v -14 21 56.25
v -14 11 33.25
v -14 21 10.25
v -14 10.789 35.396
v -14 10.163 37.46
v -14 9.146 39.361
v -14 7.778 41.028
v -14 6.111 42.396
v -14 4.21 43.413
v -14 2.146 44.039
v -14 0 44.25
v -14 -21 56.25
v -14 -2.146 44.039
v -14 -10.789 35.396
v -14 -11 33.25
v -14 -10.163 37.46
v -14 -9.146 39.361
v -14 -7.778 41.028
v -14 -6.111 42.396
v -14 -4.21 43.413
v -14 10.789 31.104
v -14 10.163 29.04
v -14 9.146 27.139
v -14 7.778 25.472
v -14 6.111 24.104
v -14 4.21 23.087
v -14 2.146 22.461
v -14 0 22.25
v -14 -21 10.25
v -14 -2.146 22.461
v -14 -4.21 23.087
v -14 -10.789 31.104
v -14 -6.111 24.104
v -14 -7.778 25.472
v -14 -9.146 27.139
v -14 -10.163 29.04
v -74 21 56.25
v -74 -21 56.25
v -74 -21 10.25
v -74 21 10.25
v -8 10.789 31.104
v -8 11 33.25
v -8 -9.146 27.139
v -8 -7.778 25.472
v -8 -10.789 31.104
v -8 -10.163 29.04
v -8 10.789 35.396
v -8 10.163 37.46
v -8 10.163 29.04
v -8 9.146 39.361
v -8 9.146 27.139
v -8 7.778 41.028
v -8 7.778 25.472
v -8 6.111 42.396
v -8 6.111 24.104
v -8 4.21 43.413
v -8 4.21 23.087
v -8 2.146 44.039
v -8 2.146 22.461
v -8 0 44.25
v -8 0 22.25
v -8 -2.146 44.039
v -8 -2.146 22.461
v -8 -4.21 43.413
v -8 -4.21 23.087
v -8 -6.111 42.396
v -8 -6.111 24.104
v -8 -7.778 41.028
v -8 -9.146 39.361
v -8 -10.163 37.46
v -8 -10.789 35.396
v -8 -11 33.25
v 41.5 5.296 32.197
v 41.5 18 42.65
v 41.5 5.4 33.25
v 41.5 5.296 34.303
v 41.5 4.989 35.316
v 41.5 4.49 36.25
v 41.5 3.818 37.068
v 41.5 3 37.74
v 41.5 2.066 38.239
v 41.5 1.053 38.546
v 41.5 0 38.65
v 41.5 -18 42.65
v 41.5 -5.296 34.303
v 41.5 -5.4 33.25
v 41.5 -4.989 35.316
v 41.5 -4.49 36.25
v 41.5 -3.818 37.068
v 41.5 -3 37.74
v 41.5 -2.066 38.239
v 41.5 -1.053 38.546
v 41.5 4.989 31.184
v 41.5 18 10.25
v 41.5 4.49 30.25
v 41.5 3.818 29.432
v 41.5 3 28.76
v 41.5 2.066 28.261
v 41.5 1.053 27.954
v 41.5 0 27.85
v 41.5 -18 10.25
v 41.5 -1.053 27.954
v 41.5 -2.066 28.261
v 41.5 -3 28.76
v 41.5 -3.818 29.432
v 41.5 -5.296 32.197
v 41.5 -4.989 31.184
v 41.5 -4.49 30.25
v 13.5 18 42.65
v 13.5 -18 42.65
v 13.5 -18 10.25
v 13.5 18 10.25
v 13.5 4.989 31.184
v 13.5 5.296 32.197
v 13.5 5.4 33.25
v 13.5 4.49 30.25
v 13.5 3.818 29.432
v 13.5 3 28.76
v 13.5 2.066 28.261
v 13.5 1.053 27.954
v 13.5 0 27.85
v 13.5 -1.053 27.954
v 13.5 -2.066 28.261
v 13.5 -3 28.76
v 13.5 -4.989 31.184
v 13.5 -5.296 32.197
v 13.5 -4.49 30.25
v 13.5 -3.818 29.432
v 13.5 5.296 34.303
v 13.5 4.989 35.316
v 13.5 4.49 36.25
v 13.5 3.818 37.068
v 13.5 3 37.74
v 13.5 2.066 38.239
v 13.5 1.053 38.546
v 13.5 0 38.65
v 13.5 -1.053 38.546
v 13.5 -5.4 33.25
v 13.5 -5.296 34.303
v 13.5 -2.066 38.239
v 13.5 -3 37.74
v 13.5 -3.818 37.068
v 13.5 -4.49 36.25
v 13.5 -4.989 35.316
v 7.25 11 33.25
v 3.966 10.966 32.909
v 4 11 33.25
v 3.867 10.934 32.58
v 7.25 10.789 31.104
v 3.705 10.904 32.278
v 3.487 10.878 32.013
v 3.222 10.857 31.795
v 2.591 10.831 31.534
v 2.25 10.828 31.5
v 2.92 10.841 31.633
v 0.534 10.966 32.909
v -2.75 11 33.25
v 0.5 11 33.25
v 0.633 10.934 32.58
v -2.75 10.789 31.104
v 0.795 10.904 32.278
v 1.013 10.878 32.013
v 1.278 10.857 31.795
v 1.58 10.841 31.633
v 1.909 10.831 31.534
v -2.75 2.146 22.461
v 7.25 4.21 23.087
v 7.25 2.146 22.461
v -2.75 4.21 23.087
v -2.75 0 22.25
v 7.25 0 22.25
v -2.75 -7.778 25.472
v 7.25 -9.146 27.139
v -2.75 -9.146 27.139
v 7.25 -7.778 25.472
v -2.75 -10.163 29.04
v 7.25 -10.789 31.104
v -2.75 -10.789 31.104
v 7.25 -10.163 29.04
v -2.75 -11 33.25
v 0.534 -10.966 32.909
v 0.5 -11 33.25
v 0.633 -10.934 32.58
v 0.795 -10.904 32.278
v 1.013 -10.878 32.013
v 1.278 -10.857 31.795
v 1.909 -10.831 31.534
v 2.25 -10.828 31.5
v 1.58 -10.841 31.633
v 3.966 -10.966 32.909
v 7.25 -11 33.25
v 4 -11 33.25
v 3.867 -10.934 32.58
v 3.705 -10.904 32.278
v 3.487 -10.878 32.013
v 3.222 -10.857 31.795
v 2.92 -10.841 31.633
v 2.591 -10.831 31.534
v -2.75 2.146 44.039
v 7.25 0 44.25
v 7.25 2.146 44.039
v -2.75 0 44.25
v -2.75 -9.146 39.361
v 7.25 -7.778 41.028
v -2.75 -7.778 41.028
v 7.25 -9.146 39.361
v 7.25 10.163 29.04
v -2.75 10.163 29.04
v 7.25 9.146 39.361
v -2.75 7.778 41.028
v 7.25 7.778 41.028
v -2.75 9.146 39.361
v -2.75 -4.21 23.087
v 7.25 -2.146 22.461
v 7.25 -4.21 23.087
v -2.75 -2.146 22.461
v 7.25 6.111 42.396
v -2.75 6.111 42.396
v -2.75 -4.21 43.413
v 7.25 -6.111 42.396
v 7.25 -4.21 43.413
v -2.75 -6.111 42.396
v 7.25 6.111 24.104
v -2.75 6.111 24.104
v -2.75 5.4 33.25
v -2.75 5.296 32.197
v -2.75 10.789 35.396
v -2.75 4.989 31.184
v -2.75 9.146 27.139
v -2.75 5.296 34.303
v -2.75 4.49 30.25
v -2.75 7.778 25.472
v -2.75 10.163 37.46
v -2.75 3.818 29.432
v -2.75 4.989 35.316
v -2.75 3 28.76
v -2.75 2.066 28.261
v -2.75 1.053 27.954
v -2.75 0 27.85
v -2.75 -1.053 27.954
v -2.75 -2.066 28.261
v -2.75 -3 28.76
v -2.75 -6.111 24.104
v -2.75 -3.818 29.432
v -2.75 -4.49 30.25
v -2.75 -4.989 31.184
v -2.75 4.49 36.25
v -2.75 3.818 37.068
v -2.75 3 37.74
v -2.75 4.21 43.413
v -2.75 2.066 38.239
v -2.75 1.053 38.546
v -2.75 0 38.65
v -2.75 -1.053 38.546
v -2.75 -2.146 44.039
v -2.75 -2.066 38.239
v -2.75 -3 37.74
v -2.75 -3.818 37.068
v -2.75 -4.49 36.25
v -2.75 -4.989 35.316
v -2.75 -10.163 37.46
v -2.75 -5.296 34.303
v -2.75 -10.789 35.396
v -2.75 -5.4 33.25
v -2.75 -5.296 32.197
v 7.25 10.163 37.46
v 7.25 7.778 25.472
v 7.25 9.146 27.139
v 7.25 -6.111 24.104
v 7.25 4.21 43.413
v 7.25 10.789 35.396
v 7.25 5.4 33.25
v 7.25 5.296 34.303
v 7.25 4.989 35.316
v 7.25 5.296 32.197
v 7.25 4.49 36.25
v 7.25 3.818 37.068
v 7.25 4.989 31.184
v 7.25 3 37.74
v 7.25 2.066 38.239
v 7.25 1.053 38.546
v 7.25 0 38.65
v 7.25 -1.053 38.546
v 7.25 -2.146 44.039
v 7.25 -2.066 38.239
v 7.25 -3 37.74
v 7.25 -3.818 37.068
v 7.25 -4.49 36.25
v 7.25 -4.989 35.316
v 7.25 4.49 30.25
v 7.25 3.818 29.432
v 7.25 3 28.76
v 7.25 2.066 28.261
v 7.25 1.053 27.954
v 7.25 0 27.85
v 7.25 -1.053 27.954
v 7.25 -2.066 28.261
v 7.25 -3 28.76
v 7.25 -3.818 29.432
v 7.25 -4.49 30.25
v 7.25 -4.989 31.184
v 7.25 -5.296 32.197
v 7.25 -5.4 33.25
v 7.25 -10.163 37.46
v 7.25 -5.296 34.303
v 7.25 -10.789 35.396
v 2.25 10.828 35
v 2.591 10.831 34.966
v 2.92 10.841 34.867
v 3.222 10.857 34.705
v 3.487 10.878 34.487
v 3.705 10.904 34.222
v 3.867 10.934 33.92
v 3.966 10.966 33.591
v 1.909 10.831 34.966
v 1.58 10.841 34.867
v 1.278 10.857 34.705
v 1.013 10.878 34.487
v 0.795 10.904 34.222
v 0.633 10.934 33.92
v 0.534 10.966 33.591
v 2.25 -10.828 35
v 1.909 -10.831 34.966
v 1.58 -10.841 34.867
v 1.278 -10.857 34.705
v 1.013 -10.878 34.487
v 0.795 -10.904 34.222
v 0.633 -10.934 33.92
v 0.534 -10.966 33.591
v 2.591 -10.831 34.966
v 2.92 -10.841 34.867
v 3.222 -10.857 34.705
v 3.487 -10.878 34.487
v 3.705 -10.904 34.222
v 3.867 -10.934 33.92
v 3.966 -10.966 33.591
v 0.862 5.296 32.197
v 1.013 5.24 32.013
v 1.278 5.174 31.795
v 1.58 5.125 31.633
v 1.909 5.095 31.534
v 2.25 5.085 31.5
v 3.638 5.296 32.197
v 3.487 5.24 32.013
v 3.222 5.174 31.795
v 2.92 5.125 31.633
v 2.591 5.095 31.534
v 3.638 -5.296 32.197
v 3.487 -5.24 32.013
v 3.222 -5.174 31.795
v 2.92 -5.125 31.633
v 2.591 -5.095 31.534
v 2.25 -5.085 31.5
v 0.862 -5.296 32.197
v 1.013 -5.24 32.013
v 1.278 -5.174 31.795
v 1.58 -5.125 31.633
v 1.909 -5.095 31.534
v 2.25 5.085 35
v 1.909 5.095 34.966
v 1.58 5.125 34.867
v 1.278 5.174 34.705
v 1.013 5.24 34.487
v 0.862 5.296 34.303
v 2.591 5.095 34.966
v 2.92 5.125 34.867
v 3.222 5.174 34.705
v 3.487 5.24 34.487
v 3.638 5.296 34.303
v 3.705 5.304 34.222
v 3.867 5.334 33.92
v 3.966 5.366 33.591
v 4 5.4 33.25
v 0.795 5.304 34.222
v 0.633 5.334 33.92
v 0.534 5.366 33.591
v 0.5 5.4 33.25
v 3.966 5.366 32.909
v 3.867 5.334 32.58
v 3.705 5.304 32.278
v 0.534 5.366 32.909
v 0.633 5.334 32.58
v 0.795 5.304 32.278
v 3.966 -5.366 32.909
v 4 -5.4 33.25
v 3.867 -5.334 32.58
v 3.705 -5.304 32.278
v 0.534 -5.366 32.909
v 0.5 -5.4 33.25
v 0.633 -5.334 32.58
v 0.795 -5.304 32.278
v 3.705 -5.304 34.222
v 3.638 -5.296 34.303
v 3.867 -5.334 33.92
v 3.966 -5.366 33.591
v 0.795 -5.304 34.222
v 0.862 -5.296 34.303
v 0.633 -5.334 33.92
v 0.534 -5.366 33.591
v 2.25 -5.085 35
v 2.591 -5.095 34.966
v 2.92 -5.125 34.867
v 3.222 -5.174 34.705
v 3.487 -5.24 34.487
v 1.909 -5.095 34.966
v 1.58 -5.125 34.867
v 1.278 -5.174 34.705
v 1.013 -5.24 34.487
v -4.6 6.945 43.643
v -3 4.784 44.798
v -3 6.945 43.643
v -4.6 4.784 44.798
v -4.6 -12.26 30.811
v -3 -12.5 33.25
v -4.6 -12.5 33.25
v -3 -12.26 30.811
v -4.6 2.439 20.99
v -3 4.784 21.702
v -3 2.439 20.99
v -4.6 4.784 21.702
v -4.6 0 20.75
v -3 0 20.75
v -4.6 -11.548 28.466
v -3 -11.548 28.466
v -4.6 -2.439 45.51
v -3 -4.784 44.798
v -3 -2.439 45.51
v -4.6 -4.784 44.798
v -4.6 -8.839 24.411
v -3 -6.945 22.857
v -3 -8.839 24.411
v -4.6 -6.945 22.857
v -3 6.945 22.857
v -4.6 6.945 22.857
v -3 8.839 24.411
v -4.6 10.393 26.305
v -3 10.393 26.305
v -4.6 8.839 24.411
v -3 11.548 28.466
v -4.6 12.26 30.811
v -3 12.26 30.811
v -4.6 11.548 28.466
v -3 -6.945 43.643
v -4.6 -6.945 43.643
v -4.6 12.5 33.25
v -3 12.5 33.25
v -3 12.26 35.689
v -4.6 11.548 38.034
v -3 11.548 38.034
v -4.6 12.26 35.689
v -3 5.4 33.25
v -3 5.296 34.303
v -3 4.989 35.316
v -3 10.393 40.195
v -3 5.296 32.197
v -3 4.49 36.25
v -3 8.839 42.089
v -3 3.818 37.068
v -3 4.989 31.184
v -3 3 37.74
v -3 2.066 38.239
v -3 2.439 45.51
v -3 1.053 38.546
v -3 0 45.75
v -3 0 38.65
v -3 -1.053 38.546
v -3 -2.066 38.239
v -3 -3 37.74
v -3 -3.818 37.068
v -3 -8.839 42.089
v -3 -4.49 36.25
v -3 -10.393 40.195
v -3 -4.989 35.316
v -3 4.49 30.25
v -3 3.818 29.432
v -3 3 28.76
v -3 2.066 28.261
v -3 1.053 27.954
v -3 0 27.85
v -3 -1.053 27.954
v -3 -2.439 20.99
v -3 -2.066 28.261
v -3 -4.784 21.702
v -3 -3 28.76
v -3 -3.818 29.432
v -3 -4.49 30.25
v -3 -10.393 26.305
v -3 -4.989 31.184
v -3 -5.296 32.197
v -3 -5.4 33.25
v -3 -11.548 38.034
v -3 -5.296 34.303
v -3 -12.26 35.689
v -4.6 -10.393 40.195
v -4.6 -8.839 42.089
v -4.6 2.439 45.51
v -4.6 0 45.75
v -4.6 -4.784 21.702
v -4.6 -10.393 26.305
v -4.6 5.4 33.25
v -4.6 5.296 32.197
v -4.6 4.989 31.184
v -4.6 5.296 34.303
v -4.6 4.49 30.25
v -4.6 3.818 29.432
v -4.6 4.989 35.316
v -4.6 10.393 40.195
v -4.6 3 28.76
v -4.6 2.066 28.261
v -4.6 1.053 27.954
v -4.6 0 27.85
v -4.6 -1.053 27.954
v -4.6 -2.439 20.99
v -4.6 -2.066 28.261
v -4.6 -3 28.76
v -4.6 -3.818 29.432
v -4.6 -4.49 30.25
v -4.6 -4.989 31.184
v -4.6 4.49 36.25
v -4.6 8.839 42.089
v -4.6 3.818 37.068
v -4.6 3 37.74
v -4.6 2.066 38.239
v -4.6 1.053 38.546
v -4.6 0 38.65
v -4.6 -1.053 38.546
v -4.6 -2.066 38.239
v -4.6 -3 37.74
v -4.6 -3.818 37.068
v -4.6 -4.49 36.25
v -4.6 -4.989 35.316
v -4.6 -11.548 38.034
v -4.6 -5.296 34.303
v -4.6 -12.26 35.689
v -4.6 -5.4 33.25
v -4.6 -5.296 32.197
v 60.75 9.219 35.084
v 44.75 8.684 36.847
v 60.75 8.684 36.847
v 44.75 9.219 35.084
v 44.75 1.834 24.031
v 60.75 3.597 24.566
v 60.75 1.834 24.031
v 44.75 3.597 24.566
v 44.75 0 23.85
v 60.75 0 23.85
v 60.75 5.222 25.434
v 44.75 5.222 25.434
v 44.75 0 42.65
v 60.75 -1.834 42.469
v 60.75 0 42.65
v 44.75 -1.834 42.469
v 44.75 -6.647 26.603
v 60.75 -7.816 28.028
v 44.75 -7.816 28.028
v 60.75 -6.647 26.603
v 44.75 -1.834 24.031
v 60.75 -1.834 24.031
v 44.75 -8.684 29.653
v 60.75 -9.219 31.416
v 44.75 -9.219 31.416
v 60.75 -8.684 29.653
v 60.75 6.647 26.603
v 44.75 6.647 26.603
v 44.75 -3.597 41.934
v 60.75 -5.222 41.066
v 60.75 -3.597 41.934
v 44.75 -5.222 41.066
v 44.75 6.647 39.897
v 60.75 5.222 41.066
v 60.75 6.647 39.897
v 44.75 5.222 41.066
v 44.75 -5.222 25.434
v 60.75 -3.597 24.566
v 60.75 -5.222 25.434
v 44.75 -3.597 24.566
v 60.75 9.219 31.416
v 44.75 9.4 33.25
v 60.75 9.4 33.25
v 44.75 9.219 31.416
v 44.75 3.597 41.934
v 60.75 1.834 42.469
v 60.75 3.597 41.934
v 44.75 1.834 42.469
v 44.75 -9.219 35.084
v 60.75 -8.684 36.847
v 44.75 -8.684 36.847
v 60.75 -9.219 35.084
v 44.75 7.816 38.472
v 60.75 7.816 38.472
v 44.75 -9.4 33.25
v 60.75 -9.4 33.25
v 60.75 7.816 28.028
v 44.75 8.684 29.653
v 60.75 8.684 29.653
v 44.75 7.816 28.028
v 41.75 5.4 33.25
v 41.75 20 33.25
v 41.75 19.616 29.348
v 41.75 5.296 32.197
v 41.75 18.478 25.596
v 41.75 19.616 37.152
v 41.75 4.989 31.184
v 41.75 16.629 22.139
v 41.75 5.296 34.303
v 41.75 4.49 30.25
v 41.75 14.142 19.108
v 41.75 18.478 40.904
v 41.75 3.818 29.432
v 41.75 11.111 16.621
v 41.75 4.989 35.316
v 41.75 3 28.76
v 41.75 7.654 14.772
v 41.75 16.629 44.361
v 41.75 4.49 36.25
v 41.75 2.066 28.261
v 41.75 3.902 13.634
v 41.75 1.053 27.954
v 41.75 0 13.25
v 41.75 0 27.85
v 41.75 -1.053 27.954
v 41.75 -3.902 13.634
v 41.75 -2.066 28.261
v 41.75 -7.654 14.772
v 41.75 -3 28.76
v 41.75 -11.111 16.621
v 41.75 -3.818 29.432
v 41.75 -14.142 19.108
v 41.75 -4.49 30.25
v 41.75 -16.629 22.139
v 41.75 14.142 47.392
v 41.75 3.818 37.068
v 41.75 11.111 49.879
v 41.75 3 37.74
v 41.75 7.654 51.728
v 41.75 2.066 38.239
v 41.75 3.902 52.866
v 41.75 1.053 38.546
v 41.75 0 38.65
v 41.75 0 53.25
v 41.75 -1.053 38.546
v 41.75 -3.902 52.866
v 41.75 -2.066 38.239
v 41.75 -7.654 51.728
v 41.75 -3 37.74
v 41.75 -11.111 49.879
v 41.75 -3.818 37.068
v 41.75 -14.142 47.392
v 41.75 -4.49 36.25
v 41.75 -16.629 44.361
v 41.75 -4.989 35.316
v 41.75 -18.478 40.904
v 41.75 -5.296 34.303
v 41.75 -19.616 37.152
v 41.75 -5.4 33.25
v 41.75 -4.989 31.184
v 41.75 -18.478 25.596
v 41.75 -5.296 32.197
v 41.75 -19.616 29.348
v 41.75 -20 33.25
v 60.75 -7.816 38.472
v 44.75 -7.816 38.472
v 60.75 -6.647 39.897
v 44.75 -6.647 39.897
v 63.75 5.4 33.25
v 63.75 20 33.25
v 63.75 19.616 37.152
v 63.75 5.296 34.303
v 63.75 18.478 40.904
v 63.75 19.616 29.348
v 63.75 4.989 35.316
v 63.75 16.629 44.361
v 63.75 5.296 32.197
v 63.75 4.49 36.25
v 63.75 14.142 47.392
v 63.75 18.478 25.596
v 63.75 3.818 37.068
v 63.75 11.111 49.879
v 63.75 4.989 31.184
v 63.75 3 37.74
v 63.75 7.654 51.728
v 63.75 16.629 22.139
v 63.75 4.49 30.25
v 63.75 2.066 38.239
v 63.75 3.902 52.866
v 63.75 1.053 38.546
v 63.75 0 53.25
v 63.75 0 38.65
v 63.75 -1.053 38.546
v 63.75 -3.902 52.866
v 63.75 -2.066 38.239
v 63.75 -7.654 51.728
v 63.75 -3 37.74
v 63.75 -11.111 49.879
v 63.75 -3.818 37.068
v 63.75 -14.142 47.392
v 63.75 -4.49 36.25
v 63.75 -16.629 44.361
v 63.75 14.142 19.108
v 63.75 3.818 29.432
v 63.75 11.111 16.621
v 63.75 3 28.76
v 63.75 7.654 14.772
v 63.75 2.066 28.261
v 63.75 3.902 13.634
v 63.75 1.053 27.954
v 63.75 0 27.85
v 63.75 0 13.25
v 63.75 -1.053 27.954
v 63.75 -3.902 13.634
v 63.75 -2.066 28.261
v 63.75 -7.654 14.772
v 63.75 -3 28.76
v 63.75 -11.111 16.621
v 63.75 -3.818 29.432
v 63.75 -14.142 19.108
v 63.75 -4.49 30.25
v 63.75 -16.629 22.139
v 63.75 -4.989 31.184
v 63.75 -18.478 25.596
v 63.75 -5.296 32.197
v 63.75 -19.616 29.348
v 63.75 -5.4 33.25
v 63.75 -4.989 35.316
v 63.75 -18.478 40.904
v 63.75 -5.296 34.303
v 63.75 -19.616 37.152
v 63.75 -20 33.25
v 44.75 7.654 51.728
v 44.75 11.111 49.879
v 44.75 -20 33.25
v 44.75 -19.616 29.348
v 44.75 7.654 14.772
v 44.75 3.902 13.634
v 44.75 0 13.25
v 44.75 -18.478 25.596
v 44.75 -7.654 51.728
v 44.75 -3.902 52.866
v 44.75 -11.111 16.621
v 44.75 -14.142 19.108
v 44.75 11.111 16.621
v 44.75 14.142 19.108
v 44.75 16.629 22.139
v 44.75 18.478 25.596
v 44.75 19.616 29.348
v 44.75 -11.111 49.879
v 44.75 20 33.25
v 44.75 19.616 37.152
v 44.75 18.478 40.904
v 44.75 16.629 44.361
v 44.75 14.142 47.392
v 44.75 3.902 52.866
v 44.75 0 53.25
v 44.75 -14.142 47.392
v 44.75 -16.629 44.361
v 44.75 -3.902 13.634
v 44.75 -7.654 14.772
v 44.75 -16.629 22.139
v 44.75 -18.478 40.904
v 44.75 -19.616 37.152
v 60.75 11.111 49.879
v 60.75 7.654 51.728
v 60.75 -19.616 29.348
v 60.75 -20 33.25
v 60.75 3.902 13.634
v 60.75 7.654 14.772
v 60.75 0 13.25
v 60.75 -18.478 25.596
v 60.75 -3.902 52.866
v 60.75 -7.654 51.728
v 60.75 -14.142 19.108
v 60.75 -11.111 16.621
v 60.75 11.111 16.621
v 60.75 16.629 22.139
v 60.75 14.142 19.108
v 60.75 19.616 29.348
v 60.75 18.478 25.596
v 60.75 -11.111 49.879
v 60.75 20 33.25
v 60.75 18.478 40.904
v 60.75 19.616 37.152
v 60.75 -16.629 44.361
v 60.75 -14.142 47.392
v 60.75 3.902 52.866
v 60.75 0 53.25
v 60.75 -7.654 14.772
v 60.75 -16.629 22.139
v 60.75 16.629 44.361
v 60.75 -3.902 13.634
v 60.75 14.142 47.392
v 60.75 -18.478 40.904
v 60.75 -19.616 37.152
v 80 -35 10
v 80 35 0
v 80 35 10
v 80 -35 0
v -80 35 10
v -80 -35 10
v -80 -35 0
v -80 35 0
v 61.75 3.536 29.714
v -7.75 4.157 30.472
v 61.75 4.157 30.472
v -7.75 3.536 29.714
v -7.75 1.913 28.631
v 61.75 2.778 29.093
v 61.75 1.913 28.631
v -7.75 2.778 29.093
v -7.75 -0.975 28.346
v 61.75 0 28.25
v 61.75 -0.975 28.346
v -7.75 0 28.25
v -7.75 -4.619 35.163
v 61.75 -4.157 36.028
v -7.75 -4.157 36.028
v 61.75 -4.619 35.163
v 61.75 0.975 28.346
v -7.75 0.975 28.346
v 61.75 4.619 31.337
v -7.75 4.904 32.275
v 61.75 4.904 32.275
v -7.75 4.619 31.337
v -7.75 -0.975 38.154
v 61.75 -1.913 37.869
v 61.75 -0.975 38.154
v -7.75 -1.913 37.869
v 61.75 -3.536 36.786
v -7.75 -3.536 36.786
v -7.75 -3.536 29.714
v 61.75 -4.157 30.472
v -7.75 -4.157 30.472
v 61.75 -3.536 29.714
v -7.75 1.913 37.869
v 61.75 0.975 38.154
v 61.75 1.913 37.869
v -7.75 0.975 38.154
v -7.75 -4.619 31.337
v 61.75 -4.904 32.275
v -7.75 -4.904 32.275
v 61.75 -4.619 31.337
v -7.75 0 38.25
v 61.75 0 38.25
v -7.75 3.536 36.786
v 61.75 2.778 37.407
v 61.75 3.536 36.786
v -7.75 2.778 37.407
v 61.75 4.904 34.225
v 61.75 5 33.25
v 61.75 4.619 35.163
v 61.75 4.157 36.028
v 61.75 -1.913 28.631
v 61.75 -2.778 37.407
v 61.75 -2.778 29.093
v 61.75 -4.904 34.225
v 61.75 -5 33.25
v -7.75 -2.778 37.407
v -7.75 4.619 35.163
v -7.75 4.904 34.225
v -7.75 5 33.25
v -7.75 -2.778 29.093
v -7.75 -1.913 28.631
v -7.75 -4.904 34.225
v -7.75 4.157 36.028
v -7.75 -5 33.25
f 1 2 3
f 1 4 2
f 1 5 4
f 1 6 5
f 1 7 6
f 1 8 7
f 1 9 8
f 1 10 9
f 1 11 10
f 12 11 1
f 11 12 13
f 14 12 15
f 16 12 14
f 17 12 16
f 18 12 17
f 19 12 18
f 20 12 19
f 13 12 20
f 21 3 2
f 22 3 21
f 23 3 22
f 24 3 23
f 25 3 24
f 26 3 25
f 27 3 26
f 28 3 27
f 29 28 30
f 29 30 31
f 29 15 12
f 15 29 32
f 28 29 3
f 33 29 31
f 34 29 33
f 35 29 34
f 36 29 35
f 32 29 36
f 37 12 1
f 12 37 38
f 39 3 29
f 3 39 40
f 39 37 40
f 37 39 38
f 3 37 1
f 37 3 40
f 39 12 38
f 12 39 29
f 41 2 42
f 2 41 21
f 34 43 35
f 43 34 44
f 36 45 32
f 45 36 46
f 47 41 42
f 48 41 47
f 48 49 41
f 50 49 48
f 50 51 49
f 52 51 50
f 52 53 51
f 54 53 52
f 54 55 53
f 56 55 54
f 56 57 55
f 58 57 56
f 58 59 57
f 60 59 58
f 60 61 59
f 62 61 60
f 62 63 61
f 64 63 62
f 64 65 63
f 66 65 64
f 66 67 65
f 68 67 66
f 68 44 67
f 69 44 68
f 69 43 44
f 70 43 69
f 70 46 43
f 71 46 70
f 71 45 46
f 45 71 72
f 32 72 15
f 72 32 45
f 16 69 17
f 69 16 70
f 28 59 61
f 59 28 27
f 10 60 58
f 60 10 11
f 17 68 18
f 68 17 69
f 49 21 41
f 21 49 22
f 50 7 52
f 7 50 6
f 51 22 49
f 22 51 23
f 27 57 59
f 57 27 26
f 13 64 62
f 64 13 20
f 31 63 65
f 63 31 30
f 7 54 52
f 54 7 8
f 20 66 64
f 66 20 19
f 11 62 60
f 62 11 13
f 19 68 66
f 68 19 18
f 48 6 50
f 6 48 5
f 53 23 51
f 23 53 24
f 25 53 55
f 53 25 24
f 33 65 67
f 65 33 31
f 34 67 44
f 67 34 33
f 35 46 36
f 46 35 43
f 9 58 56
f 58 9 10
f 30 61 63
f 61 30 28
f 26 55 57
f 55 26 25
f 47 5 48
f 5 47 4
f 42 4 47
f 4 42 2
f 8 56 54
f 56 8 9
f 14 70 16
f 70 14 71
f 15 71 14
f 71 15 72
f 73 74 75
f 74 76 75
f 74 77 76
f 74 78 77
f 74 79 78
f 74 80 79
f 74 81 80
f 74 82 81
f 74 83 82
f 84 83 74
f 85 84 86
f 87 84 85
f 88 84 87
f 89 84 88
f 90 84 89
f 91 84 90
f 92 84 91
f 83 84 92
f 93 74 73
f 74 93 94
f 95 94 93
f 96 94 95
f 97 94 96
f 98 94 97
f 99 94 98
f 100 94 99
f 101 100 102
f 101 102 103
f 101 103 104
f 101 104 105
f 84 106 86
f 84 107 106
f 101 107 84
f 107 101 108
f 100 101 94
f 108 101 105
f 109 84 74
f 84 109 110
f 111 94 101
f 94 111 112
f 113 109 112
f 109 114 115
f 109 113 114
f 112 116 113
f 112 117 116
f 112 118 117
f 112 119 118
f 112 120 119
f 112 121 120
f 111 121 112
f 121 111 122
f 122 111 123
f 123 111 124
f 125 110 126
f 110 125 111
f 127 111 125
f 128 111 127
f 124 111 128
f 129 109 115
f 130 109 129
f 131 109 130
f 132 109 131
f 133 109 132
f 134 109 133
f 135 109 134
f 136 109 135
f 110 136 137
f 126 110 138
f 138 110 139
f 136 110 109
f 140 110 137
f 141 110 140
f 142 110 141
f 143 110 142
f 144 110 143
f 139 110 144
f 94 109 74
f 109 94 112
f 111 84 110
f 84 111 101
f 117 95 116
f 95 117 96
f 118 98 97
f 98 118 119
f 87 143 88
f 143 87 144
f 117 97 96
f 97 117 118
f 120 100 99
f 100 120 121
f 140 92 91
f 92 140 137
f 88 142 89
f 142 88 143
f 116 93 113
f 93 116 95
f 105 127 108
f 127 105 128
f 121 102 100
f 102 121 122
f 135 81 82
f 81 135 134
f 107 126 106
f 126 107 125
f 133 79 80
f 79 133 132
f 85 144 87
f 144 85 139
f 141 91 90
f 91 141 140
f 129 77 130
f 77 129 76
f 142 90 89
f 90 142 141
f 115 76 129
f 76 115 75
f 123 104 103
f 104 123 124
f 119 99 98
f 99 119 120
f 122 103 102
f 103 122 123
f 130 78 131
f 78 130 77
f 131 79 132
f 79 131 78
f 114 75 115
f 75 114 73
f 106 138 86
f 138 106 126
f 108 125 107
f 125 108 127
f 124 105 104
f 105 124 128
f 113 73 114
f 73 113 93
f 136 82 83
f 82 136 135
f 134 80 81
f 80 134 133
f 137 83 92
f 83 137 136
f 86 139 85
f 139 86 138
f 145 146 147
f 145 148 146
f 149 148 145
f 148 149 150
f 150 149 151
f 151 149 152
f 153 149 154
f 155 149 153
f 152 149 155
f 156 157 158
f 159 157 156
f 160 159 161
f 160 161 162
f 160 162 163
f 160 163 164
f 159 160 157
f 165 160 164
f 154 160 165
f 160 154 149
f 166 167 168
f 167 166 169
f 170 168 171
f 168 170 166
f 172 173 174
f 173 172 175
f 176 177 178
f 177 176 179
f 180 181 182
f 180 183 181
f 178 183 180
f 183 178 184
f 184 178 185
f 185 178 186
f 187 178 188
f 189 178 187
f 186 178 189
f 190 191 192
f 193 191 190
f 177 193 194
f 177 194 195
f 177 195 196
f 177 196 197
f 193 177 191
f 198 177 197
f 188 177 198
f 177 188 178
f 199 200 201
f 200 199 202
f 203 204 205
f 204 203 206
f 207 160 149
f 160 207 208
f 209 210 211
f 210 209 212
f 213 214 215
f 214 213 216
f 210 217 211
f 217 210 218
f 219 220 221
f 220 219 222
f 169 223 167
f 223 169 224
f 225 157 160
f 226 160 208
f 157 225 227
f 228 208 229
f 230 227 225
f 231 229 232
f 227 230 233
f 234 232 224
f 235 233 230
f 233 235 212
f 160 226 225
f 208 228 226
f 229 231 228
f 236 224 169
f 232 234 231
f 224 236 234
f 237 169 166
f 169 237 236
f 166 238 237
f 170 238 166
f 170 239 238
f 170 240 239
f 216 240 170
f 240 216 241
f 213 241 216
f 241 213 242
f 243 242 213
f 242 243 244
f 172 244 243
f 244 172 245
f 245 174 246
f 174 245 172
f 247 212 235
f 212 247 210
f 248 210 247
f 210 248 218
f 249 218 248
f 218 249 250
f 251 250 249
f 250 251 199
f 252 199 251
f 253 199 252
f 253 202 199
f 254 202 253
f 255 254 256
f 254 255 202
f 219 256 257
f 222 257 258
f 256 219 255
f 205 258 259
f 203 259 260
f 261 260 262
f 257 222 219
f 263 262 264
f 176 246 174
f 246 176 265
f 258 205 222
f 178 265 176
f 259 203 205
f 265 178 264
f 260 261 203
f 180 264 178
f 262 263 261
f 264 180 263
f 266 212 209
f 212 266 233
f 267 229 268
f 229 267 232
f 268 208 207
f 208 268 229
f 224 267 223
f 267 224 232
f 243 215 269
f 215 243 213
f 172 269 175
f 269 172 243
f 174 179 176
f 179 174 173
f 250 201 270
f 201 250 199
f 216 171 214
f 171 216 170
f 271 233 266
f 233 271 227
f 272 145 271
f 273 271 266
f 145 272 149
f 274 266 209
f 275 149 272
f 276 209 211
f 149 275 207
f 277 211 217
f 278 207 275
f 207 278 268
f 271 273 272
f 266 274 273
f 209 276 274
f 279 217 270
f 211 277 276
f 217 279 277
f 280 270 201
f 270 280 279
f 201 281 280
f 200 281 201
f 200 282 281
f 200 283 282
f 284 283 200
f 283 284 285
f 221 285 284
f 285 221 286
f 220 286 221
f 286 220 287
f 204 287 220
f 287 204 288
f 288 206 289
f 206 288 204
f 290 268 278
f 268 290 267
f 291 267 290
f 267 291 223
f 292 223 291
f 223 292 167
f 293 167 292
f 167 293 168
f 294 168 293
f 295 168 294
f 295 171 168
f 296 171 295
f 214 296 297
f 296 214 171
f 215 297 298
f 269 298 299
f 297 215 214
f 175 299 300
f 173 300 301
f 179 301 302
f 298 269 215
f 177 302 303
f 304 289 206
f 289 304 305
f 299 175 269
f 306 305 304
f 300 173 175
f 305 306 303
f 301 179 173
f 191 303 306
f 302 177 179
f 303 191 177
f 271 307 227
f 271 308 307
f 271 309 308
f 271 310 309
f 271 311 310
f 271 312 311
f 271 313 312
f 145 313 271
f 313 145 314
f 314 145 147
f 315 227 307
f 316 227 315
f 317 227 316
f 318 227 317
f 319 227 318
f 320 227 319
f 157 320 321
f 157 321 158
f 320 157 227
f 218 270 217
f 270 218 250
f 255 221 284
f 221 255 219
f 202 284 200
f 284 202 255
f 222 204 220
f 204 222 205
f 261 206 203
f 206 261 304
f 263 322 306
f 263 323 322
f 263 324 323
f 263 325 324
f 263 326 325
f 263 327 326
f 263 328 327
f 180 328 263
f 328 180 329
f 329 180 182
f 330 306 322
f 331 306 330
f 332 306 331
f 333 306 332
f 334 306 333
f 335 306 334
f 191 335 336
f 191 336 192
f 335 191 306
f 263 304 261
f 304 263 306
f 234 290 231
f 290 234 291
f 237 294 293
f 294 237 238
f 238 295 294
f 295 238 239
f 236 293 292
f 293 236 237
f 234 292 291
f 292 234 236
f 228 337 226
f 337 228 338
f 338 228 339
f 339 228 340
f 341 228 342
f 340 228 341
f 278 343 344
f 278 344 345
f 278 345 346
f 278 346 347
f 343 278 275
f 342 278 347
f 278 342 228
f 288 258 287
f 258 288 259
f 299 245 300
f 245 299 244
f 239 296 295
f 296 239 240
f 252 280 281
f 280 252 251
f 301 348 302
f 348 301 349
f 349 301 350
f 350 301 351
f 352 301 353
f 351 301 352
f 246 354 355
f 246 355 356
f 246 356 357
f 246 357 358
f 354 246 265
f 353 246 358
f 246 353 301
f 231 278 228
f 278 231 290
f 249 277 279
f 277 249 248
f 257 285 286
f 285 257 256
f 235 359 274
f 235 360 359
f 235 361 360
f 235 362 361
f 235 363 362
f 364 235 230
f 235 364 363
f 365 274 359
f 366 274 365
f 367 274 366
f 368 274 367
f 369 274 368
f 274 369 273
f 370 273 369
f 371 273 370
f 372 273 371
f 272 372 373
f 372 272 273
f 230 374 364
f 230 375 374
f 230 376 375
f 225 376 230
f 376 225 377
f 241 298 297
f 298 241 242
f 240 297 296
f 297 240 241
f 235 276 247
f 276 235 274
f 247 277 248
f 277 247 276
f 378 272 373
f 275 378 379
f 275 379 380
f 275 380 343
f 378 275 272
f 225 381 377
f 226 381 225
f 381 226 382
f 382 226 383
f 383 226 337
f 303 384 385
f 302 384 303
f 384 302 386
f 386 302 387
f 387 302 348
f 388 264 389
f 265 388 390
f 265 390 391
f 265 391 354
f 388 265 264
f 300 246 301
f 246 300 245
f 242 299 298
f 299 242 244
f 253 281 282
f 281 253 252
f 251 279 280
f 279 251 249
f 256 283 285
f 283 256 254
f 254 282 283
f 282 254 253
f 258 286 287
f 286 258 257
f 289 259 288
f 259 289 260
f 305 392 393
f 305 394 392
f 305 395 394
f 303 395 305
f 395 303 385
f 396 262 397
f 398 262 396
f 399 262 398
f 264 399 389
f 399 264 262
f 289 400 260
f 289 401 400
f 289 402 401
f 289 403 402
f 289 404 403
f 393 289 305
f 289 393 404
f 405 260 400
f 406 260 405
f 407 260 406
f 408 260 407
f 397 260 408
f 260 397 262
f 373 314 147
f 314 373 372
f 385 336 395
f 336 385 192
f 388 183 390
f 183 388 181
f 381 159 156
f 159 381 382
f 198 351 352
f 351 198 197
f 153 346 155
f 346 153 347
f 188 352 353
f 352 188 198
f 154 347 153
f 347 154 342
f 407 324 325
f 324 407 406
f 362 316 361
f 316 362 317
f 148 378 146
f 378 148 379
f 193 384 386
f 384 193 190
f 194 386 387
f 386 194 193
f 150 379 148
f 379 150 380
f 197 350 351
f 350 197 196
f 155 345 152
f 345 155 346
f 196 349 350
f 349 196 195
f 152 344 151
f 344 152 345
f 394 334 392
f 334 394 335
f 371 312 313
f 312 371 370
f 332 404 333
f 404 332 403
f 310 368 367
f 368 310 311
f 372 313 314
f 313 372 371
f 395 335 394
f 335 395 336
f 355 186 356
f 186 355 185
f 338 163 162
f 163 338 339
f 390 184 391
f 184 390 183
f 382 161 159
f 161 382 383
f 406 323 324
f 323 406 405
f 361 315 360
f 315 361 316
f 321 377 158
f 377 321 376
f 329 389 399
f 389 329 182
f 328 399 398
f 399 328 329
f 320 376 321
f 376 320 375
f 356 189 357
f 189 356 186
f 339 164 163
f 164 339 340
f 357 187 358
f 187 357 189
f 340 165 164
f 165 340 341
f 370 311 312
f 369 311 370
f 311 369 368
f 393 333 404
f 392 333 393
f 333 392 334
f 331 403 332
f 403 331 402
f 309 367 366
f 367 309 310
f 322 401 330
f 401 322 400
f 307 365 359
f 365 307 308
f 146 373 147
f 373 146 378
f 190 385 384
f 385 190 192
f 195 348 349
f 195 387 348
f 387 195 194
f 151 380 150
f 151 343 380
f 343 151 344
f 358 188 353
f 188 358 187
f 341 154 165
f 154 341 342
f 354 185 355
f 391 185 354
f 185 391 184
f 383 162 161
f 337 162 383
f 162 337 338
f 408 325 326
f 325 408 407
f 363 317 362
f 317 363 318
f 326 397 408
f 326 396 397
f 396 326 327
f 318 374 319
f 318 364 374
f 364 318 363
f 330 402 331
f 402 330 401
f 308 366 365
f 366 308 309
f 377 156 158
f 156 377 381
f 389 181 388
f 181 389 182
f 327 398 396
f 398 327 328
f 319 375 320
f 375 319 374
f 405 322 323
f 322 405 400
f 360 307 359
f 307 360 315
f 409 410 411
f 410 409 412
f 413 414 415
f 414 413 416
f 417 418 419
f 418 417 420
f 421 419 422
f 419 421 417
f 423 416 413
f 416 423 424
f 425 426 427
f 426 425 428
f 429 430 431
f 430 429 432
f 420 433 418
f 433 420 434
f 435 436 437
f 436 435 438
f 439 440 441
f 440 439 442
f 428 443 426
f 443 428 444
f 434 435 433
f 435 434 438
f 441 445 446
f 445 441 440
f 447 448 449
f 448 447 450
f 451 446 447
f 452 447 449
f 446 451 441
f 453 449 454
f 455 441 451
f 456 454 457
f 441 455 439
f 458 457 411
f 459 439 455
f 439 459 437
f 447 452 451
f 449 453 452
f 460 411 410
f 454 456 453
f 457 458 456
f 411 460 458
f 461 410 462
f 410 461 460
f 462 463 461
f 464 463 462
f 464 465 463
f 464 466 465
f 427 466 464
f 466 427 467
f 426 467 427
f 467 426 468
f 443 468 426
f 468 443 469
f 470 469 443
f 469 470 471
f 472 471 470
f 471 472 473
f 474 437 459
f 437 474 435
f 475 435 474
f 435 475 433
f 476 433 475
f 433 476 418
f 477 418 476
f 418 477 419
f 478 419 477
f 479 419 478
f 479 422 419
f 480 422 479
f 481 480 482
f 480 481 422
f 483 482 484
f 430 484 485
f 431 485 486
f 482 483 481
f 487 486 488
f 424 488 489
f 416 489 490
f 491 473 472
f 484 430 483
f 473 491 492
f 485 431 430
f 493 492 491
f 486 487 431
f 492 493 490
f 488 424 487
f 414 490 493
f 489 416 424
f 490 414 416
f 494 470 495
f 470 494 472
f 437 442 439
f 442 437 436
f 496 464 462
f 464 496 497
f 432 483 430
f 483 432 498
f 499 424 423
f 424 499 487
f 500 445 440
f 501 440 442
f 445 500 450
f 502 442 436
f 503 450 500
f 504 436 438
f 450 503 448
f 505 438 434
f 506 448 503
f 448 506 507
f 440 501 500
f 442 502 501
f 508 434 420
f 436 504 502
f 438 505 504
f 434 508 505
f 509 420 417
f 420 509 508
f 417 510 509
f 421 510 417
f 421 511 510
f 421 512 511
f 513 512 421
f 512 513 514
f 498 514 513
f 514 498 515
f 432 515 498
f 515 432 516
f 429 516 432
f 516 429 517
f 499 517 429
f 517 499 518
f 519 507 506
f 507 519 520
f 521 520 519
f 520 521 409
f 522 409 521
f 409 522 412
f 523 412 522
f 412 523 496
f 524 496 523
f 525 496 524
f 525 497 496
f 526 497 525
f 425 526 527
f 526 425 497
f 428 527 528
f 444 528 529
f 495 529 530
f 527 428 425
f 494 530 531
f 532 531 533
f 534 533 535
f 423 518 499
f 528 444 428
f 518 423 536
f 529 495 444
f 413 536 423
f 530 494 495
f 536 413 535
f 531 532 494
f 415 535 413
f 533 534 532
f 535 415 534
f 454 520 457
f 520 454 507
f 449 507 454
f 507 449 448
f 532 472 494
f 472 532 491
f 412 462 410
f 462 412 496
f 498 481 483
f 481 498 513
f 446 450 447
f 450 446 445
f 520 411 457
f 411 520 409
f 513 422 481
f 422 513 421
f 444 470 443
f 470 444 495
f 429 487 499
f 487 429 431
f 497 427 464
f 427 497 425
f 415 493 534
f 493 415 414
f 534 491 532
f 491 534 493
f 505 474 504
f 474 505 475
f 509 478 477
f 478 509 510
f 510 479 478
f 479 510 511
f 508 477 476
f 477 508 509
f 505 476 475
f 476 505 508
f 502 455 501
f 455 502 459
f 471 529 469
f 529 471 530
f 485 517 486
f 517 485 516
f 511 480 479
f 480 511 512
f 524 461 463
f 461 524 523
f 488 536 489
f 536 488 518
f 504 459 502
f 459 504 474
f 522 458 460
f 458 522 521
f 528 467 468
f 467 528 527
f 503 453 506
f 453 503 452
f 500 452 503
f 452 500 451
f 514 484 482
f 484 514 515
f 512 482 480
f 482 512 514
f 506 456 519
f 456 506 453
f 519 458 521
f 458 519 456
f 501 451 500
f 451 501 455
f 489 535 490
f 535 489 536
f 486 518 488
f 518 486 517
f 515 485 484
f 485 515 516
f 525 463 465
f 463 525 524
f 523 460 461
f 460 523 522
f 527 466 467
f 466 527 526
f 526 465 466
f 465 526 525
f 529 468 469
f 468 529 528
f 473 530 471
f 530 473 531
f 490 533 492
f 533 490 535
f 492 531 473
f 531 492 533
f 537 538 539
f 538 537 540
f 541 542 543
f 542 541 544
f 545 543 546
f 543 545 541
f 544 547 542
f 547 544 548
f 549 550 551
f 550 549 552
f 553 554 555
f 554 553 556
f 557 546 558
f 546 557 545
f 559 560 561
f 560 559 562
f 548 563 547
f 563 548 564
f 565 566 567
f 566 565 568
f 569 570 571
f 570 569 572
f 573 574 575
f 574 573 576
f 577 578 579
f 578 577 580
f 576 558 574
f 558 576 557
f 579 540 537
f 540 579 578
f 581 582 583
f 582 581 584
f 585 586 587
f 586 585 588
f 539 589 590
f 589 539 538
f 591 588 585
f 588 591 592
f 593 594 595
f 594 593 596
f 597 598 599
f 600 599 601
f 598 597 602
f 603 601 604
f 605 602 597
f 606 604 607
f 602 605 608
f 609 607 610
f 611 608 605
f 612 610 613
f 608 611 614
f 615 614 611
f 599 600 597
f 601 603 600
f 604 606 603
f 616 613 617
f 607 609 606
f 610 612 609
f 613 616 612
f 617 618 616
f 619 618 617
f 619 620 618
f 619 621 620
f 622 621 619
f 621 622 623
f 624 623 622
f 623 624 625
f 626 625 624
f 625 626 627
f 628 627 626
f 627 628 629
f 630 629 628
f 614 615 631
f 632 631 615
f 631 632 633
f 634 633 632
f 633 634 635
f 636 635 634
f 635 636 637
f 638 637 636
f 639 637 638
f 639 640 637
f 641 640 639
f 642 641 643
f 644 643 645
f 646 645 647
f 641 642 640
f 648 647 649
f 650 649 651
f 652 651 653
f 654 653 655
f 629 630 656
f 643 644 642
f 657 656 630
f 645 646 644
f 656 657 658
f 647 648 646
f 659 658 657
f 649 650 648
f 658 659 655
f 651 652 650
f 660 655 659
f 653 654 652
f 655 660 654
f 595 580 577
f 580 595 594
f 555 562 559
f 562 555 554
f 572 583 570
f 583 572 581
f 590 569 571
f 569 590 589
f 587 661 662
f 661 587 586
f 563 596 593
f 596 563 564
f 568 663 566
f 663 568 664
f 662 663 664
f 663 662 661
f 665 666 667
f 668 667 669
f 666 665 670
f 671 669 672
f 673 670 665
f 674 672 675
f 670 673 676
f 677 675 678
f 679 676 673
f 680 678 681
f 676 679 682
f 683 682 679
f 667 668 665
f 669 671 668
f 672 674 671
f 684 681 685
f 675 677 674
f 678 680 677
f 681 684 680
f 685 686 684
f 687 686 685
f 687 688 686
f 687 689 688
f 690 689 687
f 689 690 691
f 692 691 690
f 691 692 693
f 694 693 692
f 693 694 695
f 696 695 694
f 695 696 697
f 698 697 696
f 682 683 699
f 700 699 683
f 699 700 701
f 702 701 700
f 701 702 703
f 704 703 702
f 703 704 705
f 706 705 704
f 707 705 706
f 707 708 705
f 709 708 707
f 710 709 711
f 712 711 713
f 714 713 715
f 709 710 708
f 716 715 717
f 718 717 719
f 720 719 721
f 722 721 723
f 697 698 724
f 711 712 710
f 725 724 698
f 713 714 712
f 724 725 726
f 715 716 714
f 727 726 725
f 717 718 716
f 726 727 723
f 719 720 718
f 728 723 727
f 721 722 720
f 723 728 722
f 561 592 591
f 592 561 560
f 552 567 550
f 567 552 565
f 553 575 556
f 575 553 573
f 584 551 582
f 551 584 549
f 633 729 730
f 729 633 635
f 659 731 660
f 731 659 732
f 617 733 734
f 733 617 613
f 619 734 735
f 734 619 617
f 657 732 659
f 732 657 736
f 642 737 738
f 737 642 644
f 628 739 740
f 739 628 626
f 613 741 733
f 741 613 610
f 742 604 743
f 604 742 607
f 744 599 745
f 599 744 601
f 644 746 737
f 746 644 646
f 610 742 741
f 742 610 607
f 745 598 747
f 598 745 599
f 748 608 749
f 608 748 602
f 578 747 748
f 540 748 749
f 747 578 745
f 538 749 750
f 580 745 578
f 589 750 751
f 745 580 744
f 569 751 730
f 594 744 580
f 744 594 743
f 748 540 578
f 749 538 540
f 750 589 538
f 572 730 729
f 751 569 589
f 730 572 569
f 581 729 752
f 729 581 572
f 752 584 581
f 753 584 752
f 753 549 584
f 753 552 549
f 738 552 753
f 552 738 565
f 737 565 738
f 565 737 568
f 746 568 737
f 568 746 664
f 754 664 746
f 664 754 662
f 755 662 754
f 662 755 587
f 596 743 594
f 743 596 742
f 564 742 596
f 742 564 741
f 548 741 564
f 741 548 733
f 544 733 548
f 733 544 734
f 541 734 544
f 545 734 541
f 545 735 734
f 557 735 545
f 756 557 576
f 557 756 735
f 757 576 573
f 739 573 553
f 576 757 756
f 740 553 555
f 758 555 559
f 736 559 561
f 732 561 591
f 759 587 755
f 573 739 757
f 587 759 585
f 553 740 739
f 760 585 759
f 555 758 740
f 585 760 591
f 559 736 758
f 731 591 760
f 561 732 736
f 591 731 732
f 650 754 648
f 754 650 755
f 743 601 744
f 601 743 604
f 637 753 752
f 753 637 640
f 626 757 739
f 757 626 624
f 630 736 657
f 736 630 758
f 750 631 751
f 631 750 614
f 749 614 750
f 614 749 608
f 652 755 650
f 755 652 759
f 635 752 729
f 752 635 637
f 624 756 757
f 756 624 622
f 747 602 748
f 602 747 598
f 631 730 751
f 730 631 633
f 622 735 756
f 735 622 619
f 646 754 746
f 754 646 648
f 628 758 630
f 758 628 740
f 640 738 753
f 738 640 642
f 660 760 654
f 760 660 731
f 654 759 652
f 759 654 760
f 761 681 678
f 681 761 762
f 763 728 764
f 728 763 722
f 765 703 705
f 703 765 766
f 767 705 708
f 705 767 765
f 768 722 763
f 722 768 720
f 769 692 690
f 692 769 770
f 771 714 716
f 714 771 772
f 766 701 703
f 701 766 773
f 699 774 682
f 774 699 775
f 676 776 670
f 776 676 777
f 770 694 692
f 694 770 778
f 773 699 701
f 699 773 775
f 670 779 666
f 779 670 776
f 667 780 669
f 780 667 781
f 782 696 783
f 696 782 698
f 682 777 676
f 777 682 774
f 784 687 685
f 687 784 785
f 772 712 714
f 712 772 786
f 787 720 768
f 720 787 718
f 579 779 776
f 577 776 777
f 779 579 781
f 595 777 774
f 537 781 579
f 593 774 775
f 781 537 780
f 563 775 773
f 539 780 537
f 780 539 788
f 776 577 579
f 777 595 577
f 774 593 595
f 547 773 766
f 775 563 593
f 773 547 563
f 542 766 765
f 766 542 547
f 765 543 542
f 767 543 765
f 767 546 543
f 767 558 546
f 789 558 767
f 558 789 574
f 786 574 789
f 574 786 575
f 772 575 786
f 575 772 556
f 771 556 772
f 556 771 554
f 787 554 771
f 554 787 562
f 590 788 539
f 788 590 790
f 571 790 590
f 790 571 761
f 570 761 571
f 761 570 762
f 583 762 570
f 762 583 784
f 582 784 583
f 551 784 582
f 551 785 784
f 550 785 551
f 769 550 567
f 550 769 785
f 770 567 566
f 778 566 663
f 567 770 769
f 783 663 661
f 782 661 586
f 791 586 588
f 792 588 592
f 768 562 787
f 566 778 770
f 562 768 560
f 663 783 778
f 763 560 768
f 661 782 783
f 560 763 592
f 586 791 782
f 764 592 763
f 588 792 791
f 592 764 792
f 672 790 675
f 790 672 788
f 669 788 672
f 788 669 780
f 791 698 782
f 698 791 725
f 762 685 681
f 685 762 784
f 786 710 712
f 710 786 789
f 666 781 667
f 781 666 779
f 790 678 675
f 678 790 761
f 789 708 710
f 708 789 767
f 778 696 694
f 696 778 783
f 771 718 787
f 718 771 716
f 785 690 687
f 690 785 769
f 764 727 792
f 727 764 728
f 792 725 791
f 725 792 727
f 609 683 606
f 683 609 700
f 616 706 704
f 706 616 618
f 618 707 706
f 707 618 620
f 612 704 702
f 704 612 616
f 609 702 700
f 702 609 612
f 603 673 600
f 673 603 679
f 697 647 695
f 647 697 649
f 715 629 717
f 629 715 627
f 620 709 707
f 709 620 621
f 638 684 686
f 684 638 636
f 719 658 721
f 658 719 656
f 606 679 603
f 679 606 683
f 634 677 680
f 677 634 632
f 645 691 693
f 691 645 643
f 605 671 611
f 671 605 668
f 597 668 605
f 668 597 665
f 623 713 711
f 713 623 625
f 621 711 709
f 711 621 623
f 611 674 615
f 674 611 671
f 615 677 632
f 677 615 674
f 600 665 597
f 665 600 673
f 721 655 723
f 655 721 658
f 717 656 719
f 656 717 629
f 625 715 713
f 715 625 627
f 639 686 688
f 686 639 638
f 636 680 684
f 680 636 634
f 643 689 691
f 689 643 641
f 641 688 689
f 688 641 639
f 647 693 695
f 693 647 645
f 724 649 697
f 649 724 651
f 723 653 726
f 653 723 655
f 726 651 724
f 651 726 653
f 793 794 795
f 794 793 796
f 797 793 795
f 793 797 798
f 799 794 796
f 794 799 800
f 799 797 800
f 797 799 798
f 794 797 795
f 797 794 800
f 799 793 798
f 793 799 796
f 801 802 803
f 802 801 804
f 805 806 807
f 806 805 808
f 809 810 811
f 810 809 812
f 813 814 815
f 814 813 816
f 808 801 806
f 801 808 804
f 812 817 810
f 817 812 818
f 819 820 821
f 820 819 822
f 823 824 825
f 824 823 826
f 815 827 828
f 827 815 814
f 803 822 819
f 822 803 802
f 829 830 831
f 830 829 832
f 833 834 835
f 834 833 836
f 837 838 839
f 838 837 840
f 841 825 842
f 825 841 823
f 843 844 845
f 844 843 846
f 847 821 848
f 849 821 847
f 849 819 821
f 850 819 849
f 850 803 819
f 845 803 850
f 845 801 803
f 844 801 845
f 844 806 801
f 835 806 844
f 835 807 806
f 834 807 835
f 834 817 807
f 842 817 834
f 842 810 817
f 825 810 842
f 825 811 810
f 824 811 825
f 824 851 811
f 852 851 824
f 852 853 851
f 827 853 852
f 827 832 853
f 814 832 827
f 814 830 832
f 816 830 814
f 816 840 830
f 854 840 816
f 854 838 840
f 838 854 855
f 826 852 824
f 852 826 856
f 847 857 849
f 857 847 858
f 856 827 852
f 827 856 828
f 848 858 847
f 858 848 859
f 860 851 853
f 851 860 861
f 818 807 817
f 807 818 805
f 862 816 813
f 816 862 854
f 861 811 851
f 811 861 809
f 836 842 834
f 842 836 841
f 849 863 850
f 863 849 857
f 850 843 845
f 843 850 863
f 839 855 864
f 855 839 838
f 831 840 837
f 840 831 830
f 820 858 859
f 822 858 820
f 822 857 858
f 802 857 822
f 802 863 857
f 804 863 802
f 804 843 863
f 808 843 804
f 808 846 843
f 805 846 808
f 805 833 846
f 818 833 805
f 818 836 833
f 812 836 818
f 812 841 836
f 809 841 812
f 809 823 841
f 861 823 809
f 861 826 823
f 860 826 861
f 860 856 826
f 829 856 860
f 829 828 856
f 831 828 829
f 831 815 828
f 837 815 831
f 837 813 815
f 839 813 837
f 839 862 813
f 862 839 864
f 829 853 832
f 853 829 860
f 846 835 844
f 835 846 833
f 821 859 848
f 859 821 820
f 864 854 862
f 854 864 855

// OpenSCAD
$fn = 32;

// ------------------------------------------------------------------------
// Motor drive station: motor 60 x 46 mm, shaft d10, pulley d40
// Every part is its own module, assembly() places every instance.
// ------------------------------------------------------------------------

// --- part 1 ---
module station_bed() {
  difference() {
    translate([-80, -35, 0]) cube([160, 70, 10]);
  }
}

// --- part 2 ---
module drive_motor() {
  union() {
    translate([-30, -21, 0]) cube([60, 42, 46]);
    translate([33, 0, 23]) rotate([0, 90, 0]) cylinder(h = 6, d = 22, center = true);
  }
}

// --- part 3 ---
module pillow_block() {
  difference() {
    translate([-14, -18, 0]) cube([28, 36, 32.4]);
    translate([0, 0, 23]) rotate([0, 90, 0]) cylinder(h = 30, d = 10.8, center = true);
  }
}

// --- part 4 ---
module drive_shaft() {
  translate([0, 0, -34.75]) cylinder(h = 69.5, d = 10);
}

// --- part 5 ---
module shaft_collar() {
  difference() {
    cylinder(h = 10, d = 22);
    translate([0, 0, -1]) cylinder(h = 12, d = 10.8);
    translate([0, 0, 5]) rotate([90, 0, 0]) cylinder(h = 24, d = 3.5, center = true);
  }
}

// --- part 6 ---
module collar_washer() {
  difference() {
      translate([0, 0, 0]) cylinder(h = 1.6, d = 25);
      translate([0, 0, -1]) cylinder(h = 3.6, d = 10.8);
    }
}

// --- part 7 ---
module drive_pulley() {
  difference() {
    union() {
      cylinder(h = 22, d = 18.8);
      cylinder(h = 3, d = 40);
      translate([0, 0, 19]) cylinder(h = 3, d = 40);
    }
    translate([0, 0, -1]) cylinder(h = 24, d = 10.8);
  }
}

// --- assembly ---
module assembly() {
  color([0.80, 0.24, 0.20]) translate([0, 0, 0]) rotate([0, 0, 0]) station_bed();
  color([0.20, 0.45, 0.75]) translate([-44, 0, 10.25]) rotate([0, 0, 0]) drive_motor();
  color([0.25, 0.62, 0.32]) translate([27.5, 0, 10.25]) rotate([0, 0, 0]) pillow_block();
  color([0.92, 0.70, 0.18]) translate([27, 0, 33.25]) rotate([0, 90, 0]) drive_shaft();
  color([0.58, 0.35, 0.70]) translate([-2.75, 0, 33.25]) rotate([0, 90, 0]) shaft_collar();
  color([0.16, 0.66, 0.66]) translate([-4.6, 0, 33.25]) rotate([0, 90, 0]) collar_washer();
  color([0.85, 0.48, 0.18]) translate([41.75, 0, 33.25]) rotate([0, 90, 0]) drive_pulley();
}

assembly();
